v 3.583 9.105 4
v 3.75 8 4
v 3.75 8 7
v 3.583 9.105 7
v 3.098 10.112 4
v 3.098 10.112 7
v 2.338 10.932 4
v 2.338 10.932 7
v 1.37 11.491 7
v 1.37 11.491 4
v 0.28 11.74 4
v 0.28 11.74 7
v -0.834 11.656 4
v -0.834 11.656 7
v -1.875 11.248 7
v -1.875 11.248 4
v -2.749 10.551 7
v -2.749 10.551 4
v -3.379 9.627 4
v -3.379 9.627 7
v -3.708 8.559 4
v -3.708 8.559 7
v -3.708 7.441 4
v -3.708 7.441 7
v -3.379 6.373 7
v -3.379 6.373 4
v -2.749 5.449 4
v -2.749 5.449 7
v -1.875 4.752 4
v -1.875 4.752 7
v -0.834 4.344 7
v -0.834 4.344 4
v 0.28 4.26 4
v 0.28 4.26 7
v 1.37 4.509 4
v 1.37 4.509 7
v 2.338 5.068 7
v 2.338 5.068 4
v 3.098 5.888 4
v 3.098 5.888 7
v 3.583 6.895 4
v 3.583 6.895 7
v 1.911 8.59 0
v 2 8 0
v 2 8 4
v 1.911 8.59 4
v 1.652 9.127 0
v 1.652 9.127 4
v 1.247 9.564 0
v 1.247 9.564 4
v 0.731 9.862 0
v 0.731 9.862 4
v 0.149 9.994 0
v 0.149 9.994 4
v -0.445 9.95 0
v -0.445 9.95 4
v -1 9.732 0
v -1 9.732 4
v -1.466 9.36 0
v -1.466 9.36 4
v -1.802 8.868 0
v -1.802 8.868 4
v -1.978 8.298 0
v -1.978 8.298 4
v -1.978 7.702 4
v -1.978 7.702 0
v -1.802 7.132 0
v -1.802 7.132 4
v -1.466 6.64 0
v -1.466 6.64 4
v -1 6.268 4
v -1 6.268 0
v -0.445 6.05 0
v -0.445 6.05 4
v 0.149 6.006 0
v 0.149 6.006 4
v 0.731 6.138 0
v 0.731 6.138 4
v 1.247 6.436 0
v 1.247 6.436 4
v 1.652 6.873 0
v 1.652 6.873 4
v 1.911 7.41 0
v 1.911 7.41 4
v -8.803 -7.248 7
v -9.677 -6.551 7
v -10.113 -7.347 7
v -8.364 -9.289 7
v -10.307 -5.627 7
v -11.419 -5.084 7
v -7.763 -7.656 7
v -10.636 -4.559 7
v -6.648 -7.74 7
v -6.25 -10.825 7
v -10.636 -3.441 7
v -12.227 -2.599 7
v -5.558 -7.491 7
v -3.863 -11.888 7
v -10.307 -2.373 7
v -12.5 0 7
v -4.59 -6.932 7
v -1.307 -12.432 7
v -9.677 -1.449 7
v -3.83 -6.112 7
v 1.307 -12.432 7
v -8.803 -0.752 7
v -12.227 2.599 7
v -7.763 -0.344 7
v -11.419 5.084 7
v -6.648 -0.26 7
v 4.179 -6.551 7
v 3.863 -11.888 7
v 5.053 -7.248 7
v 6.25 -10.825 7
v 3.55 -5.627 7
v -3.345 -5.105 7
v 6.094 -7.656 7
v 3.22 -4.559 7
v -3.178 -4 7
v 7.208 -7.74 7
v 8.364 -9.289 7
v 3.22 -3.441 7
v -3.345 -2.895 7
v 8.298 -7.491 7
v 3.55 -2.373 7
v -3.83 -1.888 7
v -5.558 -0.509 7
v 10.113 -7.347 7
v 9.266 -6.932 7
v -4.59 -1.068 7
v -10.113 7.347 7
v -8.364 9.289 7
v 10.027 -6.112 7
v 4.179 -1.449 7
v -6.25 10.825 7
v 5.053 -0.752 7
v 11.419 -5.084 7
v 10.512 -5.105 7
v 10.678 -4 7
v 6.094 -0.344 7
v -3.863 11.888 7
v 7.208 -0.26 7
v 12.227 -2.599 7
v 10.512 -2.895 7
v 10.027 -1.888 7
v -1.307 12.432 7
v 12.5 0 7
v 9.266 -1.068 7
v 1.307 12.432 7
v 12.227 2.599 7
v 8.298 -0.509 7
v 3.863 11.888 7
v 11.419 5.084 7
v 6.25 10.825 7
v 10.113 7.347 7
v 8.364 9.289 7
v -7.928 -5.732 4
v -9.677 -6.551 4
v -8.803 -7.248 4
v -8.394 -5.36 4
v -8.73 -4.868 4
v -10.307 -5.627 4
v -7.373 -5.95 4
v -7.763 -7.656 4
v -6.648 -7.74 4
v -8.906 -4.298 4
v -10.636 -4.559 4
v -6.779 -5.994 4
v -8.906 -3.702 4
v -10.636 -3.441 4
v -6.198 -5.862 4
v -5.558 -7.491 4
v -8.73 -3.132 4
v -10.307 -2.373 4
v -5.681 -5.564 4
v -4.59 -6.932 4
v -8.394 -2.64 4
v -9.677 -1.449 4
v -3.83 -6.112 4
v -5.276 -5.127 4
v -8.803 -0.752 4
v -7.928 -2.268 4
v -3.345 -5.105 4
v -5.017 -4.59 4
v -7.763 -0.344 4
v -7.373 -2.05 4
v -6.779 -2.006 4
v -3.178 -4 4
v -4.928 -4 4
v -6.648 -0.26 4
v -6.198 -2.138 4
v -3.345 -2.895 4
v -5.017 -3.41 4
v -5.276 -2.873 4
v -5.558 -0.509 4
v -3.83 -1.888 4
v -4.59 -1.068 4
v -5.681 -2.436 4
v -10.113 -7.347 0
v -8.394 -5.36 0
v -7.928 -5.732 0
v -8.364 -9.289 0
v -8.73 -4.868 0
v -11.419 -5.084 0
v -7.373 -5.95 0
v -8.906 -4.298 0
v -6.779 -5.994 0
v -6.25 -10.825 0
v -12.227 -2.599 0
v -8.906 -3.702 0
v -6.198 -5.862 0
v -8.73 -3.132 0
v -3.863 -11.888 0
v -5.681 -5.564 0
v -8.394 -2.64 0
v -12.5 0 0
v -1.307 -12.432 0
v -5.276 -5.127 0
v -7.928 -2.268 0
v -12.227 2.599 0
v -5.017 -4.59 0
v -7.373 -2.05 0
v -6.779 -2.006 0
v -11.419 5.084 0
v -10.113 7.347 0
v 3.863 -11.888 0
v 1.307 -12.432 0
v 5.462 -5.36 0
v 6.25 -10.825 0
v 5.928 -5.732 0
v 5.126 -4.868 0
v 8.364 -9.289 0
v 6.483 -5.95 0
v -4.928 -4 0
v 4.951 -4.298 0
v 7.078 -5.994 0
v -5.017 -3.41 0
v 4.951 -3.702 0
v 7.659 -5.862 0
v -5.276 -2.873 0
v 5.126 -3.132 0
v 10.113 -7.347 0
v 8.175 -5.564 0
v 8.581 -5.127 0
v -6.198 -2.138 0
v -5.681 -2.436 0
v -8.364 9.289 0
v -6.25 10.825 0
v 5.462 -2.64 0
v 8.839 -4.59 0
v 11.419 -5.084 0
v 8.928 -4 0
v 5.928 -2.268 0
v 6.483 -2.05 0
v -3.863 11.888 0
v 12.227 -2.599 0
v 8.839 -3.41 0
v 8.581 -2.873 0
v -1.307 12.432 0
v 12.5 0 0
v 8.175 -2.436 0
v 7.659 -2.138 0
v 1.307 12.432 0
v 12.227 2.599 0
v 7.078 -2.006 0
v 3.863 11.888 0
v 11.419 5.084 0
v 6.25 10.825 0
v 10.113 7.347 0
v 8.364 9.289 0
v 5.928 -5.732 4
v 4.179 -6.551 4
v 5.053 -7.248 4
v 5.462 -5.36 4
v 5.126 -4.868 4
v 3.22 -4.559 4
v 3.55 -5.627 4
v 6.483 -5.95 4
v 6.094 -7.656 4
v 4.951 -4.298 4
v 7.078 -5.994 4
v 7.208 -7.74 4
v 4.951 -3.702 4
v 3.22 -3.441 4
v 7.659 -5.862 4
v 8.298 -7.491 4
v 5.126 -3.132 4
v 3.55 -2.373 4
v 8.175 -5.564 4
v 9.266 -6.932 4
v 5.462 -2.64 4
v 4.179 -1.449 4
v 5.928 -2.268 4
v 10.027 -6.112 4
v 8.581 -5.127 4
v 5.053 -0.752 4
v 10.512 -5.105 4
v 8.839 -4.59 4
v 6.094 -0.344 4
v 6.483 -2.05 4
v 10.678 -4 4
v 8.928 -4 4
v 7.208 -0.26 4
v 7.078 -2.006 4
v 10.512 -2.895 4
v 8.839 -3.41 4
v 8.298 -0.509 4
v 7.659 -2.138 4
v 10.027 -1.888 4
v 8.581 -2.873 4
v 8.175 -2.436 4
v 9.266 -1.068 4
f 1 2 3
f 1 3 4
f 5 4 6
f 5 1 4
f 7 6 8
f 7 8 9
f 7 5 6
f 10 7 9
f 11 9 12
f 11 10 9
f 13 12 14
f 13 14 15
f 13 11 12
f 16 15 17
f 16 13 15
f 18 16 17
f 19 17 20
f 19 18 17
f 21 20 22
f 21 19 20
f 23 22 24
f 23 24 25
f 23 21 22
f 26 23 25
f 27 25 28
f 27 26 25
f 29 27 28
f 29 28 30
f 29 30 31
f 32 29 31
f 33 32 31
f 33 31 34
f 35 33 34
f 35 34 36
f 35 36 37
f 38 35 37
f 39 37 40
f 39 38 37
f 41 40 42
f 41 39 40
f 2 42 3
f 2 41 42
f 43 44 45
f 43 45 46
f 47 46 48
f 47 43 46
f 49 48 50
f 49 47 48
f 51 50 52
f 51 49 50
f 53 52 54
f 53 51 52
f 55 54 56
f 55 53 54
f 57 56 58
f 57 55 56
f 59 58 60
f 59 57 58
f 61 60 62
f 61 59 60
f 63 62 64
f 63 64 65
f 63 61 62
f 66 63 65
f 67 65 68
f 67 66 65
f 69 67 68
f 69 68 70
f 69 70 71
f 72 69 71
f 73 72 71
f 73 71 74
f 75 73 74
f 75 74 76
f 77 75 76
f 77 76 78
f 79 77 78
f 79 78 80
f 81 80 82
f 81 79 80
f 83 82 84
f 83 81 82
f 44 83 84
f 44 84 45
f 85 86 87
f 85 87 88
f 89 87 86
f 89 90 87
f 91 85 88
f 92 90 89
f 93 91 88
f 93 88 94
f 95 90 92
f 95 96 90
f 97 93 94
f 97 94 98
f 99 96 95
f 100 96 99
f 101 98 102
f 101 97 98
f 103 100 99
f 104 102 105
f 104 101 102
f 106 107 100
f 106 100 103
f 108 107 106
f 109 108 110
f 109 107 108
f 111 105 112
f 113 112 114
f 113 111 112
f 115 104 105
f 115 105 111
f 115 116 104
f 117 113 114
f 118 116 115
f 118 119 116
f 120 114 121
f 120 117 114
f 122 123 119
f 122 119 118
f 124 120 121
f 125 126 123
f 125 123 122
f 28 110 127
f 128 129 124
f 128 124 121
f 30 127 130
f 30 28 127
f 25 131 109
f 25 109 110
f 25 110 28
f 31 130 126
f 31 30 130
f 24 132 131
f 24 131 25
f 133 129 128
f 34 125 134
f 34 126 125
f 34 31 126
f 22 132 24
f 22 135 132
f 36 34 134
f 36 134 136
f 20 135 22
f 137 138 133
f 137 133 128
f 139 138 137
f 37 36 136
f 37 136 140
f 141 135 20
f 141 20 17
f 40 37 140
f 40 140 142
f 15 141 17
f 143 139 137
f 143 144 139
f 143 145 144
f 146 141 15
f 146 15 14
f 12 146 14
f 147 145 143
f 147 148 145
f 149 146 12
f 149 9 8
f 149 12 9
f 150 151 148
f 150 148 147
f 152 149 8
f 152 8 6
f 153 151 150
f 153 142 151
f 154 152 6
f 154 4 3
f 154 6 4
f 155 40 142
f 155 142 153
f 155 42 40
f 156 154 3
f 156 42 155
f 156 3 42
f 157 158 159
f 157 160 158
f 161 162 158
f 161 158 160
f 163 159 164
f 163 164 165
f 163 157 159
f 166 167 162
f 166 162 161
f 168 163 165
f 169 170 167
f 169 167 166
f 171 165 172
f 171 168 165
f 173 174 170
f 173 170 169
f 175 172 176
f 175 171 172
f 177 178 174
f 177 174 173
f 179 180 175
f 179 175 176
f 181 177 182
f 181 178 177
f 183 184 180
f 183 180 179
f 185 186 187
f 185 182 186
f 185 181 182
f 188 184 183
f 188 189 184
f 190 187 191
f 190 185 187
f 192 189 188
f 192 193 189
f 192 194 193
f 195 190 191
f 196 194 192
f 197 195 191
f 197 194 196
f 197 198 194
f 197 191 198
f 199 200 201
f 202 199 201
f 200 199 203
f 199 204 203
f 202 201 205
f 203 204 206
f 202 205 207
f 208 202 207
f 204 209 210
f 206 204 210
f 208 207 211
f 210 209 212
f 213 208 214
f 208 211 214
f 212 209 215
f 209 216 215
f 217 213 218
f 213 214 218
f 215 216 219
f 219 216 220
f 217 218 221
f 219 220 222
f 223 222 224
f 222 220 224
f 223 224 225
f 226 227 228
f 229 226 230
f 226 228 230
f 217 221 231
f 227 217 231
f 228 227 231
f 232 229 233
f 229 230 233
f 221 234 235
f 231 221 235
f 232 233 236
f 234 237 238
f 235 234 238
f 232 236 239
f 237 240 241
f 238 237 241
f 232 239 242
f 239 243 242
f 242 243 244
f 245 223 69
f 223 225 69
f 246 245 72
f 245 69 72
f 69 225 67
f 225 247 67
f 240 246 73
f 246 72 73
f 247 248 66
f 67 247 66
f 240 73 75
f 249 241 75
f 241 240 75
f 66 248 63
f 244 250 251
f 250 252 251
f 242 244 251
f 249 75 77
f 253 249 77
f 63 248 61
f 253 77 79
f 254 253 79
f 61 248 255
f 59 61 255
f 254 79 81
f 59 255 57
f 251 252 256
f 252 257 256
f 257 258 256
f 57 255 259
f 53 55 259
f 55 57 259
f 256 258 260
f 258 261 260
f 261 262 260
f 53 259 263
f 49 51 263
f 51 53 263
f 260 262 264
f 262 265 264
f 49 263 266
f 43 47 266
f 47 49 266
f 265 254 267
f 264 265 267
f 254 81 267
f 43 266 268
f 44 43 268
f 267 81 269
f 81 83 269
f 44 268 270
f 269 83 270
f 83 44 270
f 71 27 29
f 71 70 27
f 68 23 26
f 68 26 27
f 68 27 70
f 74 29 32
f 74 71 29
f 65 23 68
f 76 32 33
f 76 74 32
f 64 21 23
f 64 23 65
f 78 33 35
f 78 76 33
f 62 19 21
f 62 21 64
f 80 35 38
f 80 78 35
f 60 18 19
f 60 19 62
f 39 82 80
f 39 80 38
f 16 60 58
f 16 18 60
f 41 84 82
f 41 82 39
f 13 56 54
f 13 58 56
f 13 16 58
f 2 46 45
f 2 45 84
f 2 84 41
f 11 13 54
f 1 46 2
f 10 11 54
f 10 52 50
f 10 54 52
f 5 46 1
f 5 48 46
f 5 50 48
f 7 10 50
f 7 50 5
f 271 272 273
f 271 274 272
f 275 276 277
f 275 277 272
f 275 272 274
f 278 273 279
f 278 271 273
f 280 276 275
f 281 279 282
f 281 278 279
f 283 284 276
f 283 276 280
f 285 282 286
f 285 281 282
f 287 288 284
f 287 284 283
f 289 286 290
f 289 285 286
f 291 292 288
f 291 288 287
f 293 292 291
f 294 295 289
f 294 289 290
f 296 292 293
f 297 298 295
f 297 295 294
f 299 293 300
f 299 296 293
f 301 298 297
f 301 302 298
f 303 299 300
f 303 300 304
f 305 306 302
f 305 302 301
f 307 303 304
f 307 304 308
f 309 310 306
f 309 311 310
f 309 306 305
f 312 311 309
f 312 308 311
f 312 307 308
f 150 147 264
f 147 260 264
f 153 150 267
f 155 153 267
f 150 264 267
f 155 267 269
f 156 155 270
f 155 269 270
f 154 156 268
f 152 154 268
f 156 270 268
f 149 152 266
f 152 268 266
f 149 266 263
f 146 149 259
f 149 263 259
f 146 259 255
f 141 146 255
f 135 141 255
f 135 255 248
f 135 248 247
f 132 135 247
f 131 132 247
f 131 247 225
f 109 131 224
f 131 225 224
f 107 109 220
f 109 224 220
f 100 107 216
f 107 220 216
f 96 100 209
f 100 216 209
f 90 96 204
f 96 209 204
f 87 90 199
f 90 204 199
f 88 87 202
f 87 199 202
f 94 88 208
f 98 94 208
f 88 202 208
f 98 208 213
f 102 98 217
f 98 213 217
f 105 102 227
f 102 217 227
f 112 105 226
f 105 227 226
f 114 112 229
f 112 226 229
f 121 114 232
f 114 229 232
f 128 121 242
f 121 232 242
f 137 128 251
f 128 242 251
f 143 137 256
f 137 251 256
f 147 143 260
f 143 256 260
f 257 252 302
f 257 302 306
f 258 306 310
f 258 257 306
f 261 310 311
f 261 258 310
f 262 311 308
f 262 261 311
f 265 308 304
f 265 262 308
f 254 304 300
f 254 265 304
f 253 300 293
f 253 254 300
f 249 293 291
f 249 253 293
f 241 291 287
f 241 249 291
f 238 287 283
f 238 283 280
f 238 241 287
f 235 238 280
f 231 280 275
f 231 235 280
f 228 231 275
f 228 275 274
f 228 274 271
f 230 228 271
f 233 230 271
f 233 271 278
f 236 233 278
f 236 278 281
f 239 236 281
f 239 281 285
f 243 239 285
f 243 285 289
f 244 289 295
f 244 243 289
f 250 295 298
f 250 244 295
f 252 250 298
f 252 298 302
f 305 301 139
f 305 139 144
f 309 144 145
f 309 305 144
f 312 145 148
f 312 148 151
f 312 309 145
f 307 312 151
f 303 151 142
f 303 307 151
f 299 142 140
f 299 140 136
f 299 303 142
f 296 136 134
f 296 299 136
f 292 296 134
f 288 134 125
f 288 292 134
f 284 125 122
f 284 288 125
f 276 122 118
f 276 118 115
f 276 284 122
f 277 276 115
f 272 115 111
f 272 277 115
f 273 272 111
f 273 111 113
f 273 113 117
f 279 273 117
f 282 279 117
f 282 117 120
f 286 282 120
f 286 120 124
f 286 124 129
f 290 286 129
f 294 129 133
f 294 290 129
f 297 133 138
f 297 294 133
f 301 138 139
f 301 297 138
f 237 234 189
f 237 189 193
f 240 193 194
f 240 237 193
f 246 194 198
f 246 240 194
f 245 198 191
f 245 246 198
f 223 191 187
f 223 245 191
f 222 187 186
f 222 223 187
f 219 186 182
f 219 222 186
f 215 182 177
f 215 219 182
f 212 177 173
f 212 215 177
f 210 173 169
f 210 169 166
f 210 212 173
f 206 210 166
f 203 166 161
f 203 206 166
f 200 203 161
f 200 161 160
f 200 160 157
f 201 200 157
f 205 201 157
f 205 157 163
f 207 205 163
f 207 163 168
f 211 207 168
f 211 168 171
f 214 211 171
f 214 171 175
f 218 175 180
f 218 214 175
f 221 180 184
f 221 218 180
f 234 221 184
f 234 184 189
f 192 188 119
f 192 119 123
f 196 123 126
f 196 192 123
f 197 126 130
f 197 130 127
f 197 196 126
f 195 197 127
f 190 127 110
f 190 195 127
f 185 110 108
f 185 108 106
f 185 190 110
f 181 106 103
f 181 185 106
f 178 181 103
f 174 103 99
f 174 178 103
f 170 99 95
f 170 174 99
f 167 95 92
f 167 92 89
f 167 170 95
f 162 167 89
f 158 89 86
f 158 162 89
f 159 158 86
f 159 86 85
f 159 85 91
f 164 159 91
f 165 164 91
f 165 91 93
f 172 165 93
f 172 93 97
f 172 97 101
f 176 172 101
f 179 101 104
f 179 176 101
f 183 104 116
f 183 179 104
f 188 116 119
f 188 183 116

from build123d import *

# Parameters (mm, degrees)
SKETCH_1_R      = 12.5
SKETCH_1_R_2    = 2
EXTRUDE_1_DEPTH = 4
SKETCH_2_R      = 12.5
SKETCH_2_R_2    = 3.75
EXTRUDE_2_DEPTH = 3


with BuildPart() as part:
    # 草图1 → 凸台-拉伸1 (new body)
    with BuildSketch(Plane.XY):
        Circle(SKETCH_1_R)
        with Locations((0, 8)):
            Circle(SKETCH_1_R_2, mode=Mode.SUBTRACT)
        with Locations((6.92820323, -4)):
            Circle(SKETCH_1_R_2, mode=Mode.SUBTRACT)
        with Locations((-6.92820323, -4)):
            Circle(SKETCH_1_R_2, mode=Mode.SUBTRACT)
    extrude(amount=EXTRUDE_1_DEPTH)

    # 草图2 → 凸台-拉伸2 (add)
    with BuildSketch(Plane.XY.offset(4)):
        Circle(SKETCH_2_R)
        with Locations((0, 8)):
            Circle(SKETCH_2_R_2, mode=Mode.SUBTRACT)
        with Locations((6.92820323, -4)):
            Circle(SKETCH_2_R_2, mode=Mode.SUBTRACT)
        with Locations((-6.92820323, -4)):
            Circle(SKETCH_2_R_2, mode=Mode.SUBTRACT)
    extrude(amount=EXTRUDE_2_DEPTH)


solid = part.part
